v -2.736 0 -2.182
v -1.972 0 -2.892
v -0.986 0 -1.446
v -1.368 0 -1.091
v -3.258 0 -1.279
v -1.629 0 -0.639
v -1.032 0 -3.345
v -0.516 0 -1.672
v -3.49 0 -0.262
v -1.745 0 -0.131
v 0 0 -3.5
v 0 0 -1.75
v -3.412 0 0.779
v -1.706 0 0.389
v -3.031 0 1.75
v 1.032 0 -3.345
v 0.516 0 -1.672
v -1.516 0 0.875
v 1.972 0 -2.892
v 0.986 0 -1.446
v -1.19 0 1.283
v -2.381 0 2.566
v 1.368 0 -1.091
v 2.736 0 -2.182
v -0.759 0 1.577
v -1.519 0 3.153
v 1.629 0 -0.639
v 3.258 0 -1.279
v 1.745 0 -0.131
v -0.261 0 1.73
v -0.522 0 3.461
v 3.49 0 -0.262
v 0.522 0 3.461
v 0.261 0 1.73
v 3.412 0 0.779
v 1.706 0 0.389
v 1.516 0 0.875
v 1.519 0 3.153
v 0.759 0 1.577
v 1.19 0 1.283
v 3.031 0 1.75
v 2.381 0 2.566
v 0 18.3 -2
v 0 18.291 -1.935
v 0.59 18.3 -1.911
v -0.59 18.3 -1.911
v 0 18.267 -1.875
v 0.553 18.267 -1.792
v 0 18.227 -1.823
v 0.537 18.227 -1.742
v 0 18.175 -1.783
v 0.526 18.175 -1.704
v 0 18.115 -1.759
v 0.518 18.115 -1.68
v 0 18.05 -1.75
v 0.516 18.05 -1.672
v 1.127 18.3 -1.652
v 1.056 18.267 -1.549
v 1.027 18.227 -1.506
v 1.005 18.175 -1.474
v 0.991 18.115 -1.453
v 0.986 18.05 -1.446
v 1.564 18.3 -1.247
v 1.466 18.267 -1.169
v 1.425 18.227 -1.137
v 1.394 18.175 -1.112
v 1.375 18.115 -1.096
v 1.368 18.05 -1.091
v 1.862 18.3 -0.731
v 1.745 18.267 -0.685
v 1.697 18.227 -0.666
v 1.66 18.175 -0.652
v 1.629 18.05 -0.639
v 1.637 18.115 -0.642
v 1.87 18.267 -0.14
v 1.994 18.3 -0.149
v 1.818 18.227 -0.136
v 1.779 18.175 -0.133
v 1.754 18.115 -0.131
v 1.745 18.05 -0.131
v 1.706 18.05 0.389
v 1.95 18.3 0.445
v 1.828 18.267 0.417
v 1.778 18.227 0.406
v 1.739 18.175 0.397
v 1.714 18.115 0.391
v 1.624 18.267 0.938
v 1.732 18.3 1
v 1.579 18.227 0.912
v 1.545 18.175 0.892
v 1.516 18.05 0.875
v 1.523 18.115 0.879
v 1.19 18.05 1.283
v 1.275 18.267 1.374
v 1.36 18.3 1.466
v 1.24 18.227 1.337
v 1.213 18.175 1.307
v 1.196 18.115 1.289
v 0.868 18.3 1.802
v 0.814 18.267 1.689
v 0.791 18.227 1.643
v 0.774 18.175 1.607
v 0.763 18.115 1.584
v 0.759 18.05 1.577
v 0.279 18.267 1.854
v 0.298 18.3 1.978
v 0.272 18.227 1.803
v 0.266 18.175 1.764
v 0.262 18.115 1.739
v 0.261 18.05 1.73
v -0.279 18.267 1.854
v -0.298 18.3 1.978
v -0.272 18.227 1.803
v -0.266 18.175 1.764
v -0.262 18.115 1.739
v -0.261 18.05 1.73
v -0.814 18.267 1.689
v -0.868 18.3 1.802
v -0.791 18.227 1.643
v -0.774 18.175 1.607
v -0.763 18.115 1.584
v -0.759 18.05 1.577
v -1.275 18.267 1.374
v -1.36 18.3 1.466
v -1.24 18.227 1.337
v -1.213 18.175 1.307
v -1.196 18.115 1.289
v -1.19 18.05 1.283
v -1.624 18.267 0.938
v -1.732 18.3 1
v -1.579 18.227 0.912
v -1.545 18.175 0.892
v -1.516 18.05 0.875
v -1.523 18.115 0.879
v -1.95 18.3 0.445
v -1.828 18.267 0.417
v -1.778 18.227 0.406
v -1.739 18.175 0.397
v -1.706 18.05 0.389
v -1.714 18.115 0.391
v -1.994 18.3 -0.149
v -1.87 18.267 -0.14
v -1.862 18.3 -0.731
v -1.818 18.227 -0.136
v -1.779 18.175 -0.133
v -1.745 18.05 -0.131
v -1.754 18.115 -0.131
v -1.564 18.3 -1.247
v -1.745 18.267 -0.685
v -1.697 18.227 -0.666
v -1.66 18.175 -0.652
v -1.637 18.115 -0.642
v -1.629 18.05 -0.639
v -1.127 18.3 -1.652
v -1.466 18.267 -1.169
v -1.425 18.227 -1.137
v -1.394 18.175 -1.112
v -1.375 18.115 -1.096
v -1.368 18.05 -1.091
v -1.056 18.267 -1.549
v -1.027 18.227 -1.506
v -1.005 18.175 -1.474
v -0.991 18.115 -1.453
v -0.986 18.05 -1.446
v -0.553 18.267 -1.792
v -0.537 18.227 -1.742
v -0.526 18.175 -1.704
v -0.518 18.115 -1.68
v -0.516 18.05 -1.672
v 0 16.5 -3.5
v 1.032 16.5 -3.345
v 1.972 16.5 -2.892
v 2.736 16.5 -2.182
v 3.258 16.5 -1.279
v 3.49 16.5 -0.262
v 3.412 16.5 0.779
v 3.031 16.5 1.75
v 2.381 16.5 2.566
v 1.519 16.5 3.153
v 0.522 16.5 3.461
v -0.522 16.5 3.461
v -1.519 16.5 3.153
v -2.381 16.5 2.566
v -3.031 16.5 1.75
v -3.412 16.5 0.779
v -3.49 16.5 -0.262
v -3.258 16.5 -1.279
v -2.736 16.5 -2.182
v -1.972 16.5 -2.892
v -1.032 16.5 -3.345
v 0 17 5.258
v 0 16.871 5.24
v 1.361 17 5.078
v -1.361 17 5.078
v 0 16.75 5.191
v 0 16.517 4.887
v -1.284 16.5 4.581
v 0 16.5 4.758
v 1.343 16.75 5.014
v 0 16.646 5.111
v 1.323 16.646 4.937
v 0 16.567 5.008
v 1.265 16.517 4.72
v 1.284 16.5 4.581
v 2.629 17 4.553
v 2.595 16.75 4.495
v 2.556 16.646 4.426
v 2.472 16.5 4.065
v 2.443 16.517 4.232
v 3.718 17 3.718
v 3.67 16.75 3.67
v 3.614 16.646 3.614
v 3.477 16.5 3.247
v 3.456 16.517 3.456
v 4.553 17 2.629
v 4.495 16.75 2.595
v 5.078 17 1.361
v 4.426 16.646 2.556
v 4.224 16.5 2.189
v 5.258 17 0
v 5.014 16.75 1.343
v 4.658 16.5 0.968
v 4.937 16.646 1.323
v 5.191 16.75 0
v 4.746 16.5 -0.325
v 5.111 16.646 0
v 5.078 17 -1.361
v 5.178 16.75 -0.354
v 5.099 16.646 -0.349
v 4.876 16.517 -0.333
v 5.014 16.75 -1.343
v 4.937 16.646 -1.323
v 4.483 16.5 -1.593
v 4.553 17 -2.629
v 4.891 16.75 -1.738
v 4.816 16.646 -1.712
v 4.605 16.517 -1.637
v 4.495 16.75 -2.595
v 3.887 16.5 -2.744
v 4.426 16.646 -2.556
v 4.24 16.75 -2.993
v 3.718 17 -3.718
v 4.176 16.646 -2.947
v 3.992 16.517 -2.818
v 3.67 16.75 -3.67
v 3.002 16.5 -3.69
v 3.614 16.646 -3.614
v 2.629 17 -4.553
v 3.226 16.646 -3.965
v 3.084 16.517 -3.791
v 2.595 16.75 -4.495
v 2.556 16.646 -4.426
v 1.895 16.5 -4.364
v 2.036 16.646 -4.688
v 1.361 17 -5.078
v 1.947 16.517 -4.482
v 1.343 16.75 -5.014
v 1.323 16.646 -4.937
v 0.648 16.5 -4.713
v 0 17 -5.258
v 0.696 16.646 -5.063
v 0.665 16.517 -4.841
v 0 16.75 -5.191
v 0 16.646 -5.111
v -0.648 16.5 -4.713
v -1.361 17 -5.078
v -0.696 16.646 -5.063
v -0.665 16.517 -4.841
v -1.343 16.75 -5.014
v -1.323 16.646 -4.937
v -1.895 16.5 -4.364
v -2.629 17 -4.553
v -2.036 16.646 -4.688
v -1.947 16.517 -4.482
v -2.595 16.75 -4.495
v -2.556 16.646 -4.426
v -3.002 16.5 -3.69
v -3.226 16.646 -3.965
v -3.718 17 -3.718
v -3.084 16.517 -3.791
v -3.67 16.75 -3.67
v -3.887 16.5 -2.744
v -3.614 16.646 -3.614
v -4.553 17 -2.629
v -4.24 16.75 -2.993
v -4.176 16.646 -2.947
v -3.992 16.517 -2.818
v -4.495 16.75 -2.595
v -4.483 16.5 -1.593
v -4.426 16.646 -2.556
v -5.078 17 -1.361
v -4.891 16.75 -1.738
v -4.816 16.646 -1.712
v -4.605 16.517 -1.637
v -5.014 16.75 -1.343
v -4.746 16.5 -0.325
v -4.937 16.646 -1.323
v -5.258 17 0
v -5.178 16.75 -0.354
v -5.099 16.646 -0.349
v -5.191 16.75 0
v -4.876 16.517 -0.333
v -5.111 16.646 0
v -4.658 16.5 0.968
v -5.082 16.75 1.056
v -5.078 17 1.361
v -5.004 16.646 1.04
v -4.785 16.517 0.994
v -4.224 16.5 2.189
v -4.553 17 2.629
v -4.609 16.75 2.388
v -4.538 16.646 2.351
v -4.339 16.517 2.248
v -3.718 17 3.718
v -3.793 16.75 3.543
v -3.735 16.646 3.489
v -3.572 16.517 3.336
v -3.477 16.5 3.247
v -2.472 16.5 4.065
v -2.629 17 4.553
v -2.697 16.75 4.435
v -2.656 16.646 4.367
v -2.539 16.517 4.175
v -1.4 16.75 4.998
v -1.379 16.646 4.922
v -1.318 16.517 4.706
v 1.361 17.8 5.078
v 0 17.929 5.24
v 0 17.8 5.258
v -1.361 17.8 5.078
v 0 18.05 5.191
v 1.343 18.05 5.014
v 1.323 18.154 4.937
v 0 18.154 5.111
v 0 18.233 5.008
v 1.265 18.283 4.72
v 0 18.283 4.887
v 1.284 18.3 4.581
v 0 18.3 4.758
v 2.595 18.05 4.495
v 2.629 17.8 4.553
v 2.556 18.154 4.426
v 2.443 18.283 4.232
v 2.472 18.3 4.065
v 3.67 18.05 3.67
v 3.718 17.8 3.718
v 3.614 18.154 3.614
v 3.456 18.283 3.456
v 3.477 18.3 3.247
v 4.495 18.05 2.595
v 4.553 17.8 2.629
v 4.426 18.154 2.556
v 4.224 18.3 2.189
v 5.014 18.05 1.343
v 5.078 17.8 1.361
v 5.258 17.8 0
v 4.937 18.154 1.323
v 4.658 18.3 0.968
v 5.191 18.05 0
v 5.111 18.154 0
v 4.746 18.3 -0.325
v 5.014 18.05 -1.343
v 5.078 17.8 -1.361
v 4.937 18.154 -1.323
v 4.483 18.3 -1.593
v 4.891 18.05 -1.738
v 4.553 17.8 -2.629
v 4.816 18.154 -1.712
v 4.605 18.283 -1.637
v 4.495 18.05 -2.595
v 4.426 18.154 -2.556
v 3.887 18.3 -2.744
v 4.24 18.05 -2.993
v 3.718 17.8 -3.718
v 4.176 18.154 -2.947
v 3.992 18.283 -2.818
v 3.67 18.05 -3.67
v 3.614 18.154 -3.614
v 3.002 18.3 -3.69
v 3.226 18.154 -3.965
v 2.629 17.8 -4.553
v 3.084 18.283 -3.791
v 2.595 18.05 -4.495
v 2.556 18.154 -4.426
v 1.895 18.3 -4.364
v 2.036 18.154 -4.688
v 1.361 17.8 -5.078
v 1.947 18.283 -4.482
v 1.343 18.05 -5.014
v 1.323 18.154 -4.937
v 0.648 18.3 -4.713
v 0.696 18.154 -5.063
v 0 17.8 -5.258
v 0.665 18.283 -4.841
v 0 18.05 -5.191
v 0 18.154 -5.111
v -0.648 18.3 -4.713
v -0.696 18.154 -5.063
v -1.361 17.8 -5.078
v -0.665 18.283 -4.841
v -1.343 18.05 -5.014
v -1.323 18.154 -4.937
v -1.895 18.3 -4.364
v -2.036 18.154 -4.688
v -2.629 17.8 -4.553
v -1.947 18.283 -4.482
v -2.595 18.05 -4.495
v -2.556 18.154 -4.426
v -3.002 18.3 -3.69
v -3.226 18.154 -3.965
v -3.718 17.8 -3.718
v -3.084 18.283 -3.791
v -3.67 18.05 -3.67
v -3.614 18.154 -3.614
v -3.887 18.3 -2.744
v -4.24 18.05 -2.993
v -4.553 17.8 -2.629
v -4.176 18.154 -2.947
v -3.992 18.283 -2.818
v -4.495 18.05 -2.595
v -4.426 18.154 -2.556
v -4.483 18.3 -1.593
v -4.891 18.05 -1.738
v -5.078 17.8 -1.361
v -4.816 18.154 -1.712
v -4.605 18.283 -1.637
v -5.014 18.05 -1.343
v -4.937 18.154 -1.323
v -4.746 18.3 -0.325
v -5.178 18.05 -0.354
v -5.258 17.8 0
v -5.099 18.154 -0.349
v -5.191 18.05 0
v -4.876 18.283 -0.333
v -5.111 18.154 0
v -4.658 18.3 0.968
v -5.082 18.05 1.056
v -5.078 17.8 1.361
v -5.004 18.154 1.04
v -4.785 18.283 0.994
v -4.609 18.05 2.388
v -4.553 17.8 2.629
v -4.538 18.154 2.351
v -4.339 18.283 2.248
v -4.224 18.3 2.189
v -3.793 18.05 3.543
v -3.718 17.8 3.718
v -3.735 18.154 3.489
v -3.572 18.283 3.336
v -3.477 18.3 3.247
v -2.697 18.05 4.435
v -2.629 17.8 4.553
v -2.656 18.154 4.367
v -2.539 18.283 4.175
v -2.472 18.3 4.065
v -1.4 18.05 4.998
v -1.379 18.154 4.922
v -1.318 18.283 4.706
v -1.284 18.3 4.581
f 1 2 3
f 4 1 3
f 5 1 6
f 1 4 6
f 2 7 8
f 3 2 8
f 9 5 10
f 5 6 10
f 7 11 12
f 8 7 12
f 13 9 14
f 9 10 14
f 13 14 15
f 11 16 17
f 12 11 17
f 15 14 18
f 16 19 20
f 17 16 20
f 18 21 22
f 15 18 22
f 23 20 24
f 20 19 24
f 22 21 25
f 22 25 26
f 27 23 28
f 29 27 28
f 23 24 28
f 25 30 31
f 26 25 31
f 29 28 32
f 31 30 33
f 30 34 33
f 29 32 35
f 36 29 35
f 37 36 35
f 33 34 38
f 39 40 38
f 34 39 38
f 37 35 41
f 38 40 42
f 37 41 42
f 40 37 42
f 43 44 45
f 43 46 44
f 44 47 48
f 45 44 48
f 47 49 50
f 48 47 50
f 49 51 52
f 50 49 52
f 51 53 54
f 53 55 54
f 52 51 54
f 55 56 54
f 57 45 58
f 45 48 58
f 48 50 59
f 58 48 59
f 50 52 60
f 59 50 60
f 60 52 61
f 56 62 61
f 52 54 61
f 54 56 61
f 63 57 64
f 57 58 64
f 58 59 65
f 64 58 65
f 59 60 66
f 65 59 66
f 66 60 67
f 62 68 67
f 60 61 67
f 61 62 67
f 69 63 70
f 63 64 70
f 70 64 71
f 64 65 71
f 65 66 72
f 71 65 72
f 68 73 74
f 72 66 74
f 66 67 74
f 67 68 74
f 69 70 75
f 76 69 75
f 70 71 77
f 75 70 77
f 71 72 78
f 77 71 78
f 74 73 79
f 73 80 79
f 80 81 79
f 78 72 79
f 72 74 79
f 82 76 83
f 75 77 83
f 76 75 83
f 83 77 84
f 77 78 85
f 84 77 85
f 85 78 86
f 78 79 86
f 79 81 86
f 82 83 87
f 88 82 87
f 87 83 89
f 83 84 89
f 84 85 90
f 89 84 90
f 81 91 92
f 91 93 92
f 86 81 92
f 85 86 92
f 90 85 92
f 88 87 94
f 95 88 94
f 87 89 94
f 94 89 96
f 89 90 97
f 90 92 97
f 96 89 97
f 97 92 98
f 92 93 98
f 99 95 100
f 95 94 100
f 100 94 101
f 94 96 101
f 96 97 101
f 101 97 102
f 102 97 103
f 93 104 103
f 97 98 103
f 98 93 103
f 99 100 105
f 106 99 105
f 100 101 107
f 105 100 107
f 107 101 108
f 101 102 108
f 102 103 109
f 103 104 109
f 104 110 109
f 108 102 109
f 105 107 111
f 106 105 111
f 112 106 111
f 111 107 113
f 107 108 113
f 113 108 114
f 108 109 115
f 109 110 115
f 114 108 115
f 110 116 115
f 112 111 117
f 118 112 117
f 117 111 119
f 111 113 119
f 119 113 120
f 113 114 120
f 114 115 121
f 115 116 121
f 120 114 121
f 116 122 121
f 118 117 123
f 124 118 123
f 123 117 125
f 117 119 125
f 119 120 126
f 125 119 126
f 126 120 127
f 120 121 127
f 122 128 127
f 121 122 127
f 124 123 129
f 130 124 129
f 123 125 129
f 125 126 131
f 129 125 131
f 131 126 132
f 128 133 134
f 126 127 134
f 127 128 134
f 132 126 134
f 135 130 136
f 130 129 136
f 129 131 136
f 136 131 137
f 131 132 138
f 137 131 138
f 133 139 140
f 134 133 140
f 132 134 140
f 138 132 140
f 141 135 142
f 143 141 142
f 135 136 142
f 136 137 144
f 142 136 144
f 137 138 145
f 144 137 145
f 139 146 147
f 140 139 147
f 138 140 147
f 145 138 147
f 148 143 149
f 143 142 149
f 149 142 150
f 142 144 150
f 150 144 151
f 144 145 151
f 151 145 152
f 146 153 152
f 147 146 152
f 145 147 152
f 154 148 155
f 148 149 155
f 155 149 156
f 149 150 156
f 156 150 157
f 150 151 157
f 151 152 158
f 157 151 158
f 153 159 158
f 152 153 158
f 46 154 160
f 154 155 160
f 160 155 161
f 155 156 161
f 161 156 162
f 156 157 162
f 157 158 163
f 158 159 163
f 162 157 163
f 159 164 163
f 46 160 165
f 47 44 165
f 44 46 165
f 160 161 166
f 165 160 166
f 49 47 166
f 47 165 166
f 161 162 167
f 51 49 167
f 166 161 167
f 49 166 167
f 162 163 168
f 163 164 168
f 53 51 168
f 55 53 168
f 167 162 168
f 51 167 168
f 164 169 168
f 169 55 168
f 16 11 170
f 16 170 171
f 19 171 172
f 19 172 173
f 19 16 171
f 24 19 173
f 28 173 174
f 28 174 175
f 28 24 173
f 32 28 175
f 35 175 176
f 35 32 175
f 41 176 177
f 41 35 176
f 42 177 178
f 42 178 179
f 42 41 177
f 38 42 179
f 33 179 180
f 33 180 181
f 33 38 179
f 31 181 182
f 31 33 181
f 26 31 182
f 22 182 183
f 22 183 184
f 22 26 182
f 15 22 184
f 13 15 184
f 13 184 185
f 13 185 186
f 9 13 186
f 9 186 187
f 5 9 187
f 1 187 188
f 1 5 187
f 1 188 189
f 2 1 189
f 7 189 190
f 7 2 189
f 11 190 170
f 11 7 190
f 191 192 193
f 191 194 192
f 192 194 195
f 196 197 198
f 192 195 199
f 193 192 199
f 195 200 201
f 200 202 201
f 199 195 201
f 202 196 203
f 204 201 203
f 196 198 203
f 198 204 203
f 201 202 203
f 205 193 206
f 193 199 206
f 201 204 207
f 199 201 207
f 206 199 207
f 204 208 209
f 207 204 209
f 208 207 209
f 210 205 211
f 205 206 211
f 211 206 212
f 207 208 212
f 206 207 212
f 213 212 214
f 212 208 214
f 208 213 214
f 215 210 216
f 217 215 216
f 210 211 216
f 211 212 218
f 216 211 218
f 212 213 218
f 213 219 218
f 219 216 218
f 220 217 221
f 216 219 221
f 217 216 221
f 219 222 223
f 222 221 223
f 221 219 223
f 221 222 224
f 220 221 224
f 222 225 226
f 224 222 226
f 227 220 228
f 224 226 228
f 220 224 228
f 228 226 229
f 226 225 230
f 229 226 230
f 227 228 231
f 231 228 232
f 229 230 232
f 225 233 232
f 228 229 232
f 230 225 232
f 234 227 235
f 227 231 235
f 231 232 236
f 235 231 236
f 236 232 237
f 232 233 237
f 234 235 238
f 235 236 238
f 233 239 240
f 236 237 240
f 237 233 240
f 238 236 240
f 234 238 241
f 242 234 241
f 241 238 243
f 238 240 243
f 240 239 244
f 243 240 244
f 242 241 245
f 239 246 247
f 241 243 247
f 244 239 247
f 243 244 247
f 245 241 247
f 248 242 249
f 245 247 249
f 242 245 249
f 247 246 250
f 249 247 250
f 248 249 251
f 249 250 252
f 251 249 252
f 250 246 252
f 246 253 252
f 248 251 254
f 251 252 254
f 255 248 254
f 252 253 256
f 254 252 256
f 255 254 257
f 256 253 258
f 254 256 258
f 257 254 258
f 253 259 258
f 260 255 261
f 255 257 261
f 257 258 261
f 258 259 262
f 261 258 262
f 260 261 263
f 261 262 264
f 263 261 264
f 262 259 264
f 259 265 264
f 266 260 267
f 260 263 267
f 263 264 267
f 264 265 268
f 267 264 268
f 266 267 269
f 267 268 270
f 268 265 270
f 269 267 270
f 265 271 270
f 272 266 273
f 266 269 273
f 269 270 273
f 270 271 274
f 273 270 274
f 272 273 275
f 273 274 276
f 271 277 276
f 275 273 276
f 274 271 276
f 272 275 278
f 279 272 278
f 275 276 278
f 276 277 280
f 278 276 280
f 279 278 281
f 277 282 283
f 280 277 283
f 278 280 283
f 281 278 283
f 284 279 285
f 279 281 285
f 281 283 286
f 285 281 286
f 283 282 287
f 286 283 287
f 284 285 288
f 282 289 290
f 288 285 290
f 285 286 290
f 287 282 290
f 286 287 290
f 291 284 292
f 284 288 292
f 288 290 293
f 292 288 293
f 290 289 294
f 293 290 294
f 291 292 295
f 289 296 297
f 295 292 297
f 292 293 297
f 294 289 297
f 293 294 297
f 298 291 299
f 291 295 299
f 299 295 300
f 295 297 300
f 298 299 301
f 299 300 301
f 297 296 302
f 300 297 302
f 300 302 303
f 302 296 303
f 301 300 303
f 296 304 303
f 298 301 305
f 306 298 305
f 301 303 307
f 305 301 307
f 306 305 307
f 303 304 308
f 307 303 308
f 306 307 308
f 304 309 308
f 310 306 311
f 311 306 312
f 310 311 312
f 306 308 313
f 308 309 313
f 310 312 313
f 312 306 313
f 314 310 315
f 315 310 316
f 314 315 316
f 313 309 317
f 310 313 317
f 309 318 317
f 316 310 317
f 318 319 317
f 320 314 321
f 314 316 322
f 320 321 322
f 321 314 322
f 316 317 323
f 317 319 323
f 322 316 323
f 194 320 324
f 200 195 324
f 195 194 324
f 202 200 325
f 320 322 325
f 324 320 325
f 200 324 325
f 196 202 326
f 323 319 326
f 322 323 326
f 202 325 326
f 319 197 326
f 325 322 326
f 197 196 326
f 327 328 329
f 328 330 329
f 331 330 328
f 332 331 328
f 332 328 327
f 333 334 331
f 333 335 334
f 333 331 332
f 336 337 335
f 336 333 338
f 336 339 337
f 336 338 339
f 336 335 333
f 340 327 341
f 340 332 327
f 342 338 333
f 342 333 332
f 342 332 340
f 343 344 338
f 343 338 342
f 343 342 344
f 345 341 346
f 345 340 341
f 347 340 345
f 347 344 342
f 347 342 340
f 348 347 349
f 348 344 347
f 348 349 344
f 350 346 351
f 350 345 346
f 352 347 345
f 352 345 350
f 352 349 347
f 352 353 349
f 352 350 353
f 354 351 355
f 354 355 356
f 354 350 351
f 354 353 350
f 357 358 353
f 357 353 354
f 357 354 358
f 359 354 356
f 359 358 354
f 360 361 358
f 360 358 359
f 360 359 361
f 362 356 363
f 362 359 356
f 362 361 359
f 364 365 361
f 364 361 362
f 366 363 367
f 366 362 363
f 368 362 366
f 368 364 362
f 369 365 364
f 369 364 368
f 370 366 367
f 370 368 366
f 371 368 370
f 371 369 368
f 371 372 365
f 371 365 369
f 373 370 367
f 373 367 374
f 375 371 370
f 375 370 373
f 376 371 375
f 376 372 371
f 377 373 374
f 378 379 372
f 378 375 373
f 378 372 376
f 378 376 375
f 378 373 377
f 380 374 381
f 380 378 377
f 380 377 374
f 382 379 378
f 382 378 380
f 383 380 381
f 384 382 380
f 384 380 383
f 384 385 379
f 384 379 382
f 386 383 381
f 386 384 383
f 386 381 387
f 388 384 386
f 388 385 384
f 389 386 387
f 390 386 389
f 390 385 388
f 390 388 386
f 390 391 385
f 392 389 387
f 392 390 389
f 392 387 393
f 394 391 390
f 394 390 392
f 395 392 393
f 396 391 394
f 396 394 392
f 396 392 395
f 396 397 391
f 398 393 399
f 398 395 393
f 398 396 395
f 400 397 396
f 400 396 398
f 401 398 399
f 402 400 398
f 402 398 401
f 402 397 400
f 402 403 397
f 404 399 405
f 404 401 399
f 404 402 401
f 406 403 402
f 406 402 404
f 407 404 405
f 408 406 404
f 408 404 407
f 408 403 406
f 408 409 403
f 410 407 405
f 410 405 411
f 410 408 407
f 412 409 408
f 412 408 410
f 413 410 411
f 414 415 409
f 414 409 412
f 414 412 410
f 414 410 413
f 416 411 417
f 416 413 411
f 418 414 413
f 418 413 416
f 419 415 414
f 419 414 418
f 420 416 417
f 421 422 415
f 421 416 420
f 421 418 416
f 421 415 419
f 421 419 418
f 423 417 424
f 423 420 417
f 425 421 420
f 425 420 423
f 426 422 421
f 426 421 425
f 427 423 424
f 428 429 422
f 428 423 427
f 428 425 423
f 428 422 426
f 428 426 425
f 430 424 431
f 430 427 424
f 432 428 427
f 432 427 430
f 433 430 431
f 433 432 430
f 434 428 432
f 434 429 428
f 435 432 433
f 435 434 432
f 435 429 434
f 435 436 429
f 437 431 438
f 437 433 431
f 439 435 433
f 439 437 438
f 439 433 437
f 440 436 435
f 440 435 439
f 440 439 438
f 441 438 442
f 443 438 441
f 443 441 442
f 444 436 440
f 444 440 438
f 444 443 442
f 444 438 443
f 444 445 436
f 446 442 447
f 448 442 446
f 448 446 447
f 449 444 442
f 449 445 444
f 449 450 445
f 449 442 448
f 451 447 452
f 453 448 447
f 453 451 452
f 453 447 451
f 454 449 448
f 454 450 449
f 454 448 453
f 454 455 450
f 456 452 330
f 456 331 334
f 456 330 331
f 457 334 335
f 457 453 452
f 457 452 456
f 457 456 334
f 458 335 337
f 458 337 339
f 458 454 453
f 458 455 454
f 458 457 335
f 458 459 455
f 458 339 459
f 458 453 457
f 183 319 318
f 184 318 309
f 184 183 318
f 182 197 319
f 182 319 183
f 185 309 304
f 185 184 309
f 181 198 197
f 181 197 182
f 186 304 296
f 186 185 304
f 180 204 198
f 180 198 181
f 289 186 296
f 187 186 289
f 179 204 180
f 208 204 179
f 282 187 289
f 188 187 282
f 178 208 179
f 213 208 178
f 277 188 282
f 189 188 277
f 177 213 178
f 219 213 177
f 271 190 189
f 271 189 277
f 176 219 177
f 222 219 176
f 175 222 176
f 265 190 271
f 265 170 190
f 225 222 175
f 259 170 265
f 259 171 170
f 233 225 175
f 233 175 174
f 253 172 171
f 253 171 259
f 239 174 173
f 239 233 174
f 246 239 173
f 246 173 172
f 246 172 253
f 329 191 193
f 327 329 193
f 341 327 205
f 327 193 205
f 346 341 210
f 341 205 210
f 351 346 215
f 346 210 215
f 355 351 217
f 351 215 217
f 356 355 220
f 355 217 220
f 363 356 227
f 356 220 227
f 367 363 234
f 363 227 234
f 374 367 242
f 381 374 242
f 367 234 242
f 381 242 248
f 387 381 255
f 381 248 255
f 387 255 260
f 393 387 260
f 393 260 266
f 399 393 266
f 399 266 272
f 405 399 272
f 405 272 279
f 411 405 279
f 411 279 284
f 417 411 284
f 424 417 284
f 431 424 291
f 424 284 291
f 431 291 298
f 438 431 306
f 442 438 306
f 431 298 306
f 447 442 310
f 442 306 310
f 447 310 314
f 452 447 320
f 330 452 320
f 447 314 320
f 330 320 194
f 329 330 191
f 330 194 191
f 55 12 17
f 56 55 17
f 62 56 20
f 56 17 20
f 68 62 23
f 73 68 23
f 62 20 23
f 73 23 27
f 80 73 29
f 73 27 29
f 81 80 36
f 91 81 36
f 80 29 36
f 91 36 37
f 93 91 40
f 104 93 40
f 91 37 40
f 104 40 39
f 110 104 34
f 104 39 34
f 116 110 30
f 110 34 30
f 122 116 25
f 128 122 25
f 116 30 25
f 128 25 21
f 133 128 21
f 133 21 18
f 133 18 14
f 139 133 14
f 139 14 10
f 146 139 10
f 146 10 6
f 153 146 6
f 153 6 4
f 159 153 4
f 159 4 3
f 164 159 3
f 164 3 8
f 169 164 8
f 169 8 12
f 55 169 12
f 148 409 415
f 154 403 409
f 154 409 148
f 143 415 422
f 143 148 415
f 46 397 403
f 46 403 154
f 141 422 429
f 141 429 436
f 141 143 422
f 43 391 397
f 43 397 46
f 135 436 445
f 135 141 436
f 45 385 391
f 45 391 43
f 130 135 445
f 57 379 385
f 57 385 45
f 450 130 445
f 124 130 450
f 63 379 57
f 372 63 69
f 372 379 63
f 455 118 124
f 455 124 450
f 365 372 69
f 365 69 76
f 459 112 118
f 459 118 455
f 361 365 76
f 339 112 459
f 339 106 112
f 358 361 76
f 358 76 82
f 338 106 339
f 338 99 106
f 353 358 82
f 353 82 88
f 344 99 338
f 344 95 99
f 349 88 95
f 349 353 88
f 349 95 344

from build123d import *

# Parameters (mm, degrees)
SKETCH1_R           = 5.2575
BOSS_EXTRUDE2_DEPTH = 18.3
SKETCH3_R           = 1.75
CUT_EXTRUDE2_DEPTH  = 19.8
SKETCH4_R           = 5.2575
SKETCH4_R_2         = 3.5
CUT_EXTRUDE3_DEPTH  = 16.5
FILLET1_R           = 0.5
FILLET2_R           = 0.25
FILLET3_R           = 0.5


with BuildPart() as part:
    # Sketch1 → Boss-Extrude2 (new body)
    with BuildSketch(Plane(origin=(0, 0, 0), x_dir=(1, 0, 0), z_dir=(0, 1, 0))):
        with Locations(Location((0, 0, 0), (0, 0, 270))):
            Circle(SKETCH1_R)
    extrude(amount=BOSS_EXTRUDE2_DEPTH)

    # Sketch3 → Cut-Extrude2 (cut)
    with BuildSketch(Plane(origin=(0, 0, 0), x_dir=(-1, 0, 0), z_dir=(0, -1, 0))):
        with Locations(Location((0, 0, 0), (0, 0, 90))):
            Circle(SKETCH3_R)
    extrude(amount=-CUT_EXTRUDE2_DEPTH, mode=Mode.SUBTRACT)

    # Sketch4 → Cut-Extrude3 (cut)
    with BuildSketch(Plane(origin=(0, 0, 0), x_dir=(-1, 0, 0), z_dir=(0, -1, 0))):
        with Locations(Location((0, 0, 0), (0, 0, 90))):
            Circle(SKETCH4_R)
        with Locations(Location((0, 0, 0), (0, 0, 90))):
            Circle(SKETCH4_R_2, mode=Mode.SUBTRACT)
    extrude(amount=-CUT_EXTRUDE3_DEPTH, mode=Mode.SUBTRACT)

    # Fillet1
    fillet1_edges = [part.edges().sort_by_distance(p)[0] for p in [
        (0, 18.3, -5.2575),
    ]]
    fillet(fillet1_edges, radius=FILLET1_R)

    # Fillet2
    fillet2_edges = [part.edges().sort_by_distance(p)[0] for p in [
        (0, 18.3, 1.75),
    ]]
    fillet(fillet2_edges, radius=FILLET2_R)

    # Fillet3
    fillet3_edges = [part.edges().sort_by_distance(p)[0] for p in [
        (0, 16.5, -5.2575),
    ]]
    fillet(fillet3_edges, radius=FILLET3_R)


solid = part.part
